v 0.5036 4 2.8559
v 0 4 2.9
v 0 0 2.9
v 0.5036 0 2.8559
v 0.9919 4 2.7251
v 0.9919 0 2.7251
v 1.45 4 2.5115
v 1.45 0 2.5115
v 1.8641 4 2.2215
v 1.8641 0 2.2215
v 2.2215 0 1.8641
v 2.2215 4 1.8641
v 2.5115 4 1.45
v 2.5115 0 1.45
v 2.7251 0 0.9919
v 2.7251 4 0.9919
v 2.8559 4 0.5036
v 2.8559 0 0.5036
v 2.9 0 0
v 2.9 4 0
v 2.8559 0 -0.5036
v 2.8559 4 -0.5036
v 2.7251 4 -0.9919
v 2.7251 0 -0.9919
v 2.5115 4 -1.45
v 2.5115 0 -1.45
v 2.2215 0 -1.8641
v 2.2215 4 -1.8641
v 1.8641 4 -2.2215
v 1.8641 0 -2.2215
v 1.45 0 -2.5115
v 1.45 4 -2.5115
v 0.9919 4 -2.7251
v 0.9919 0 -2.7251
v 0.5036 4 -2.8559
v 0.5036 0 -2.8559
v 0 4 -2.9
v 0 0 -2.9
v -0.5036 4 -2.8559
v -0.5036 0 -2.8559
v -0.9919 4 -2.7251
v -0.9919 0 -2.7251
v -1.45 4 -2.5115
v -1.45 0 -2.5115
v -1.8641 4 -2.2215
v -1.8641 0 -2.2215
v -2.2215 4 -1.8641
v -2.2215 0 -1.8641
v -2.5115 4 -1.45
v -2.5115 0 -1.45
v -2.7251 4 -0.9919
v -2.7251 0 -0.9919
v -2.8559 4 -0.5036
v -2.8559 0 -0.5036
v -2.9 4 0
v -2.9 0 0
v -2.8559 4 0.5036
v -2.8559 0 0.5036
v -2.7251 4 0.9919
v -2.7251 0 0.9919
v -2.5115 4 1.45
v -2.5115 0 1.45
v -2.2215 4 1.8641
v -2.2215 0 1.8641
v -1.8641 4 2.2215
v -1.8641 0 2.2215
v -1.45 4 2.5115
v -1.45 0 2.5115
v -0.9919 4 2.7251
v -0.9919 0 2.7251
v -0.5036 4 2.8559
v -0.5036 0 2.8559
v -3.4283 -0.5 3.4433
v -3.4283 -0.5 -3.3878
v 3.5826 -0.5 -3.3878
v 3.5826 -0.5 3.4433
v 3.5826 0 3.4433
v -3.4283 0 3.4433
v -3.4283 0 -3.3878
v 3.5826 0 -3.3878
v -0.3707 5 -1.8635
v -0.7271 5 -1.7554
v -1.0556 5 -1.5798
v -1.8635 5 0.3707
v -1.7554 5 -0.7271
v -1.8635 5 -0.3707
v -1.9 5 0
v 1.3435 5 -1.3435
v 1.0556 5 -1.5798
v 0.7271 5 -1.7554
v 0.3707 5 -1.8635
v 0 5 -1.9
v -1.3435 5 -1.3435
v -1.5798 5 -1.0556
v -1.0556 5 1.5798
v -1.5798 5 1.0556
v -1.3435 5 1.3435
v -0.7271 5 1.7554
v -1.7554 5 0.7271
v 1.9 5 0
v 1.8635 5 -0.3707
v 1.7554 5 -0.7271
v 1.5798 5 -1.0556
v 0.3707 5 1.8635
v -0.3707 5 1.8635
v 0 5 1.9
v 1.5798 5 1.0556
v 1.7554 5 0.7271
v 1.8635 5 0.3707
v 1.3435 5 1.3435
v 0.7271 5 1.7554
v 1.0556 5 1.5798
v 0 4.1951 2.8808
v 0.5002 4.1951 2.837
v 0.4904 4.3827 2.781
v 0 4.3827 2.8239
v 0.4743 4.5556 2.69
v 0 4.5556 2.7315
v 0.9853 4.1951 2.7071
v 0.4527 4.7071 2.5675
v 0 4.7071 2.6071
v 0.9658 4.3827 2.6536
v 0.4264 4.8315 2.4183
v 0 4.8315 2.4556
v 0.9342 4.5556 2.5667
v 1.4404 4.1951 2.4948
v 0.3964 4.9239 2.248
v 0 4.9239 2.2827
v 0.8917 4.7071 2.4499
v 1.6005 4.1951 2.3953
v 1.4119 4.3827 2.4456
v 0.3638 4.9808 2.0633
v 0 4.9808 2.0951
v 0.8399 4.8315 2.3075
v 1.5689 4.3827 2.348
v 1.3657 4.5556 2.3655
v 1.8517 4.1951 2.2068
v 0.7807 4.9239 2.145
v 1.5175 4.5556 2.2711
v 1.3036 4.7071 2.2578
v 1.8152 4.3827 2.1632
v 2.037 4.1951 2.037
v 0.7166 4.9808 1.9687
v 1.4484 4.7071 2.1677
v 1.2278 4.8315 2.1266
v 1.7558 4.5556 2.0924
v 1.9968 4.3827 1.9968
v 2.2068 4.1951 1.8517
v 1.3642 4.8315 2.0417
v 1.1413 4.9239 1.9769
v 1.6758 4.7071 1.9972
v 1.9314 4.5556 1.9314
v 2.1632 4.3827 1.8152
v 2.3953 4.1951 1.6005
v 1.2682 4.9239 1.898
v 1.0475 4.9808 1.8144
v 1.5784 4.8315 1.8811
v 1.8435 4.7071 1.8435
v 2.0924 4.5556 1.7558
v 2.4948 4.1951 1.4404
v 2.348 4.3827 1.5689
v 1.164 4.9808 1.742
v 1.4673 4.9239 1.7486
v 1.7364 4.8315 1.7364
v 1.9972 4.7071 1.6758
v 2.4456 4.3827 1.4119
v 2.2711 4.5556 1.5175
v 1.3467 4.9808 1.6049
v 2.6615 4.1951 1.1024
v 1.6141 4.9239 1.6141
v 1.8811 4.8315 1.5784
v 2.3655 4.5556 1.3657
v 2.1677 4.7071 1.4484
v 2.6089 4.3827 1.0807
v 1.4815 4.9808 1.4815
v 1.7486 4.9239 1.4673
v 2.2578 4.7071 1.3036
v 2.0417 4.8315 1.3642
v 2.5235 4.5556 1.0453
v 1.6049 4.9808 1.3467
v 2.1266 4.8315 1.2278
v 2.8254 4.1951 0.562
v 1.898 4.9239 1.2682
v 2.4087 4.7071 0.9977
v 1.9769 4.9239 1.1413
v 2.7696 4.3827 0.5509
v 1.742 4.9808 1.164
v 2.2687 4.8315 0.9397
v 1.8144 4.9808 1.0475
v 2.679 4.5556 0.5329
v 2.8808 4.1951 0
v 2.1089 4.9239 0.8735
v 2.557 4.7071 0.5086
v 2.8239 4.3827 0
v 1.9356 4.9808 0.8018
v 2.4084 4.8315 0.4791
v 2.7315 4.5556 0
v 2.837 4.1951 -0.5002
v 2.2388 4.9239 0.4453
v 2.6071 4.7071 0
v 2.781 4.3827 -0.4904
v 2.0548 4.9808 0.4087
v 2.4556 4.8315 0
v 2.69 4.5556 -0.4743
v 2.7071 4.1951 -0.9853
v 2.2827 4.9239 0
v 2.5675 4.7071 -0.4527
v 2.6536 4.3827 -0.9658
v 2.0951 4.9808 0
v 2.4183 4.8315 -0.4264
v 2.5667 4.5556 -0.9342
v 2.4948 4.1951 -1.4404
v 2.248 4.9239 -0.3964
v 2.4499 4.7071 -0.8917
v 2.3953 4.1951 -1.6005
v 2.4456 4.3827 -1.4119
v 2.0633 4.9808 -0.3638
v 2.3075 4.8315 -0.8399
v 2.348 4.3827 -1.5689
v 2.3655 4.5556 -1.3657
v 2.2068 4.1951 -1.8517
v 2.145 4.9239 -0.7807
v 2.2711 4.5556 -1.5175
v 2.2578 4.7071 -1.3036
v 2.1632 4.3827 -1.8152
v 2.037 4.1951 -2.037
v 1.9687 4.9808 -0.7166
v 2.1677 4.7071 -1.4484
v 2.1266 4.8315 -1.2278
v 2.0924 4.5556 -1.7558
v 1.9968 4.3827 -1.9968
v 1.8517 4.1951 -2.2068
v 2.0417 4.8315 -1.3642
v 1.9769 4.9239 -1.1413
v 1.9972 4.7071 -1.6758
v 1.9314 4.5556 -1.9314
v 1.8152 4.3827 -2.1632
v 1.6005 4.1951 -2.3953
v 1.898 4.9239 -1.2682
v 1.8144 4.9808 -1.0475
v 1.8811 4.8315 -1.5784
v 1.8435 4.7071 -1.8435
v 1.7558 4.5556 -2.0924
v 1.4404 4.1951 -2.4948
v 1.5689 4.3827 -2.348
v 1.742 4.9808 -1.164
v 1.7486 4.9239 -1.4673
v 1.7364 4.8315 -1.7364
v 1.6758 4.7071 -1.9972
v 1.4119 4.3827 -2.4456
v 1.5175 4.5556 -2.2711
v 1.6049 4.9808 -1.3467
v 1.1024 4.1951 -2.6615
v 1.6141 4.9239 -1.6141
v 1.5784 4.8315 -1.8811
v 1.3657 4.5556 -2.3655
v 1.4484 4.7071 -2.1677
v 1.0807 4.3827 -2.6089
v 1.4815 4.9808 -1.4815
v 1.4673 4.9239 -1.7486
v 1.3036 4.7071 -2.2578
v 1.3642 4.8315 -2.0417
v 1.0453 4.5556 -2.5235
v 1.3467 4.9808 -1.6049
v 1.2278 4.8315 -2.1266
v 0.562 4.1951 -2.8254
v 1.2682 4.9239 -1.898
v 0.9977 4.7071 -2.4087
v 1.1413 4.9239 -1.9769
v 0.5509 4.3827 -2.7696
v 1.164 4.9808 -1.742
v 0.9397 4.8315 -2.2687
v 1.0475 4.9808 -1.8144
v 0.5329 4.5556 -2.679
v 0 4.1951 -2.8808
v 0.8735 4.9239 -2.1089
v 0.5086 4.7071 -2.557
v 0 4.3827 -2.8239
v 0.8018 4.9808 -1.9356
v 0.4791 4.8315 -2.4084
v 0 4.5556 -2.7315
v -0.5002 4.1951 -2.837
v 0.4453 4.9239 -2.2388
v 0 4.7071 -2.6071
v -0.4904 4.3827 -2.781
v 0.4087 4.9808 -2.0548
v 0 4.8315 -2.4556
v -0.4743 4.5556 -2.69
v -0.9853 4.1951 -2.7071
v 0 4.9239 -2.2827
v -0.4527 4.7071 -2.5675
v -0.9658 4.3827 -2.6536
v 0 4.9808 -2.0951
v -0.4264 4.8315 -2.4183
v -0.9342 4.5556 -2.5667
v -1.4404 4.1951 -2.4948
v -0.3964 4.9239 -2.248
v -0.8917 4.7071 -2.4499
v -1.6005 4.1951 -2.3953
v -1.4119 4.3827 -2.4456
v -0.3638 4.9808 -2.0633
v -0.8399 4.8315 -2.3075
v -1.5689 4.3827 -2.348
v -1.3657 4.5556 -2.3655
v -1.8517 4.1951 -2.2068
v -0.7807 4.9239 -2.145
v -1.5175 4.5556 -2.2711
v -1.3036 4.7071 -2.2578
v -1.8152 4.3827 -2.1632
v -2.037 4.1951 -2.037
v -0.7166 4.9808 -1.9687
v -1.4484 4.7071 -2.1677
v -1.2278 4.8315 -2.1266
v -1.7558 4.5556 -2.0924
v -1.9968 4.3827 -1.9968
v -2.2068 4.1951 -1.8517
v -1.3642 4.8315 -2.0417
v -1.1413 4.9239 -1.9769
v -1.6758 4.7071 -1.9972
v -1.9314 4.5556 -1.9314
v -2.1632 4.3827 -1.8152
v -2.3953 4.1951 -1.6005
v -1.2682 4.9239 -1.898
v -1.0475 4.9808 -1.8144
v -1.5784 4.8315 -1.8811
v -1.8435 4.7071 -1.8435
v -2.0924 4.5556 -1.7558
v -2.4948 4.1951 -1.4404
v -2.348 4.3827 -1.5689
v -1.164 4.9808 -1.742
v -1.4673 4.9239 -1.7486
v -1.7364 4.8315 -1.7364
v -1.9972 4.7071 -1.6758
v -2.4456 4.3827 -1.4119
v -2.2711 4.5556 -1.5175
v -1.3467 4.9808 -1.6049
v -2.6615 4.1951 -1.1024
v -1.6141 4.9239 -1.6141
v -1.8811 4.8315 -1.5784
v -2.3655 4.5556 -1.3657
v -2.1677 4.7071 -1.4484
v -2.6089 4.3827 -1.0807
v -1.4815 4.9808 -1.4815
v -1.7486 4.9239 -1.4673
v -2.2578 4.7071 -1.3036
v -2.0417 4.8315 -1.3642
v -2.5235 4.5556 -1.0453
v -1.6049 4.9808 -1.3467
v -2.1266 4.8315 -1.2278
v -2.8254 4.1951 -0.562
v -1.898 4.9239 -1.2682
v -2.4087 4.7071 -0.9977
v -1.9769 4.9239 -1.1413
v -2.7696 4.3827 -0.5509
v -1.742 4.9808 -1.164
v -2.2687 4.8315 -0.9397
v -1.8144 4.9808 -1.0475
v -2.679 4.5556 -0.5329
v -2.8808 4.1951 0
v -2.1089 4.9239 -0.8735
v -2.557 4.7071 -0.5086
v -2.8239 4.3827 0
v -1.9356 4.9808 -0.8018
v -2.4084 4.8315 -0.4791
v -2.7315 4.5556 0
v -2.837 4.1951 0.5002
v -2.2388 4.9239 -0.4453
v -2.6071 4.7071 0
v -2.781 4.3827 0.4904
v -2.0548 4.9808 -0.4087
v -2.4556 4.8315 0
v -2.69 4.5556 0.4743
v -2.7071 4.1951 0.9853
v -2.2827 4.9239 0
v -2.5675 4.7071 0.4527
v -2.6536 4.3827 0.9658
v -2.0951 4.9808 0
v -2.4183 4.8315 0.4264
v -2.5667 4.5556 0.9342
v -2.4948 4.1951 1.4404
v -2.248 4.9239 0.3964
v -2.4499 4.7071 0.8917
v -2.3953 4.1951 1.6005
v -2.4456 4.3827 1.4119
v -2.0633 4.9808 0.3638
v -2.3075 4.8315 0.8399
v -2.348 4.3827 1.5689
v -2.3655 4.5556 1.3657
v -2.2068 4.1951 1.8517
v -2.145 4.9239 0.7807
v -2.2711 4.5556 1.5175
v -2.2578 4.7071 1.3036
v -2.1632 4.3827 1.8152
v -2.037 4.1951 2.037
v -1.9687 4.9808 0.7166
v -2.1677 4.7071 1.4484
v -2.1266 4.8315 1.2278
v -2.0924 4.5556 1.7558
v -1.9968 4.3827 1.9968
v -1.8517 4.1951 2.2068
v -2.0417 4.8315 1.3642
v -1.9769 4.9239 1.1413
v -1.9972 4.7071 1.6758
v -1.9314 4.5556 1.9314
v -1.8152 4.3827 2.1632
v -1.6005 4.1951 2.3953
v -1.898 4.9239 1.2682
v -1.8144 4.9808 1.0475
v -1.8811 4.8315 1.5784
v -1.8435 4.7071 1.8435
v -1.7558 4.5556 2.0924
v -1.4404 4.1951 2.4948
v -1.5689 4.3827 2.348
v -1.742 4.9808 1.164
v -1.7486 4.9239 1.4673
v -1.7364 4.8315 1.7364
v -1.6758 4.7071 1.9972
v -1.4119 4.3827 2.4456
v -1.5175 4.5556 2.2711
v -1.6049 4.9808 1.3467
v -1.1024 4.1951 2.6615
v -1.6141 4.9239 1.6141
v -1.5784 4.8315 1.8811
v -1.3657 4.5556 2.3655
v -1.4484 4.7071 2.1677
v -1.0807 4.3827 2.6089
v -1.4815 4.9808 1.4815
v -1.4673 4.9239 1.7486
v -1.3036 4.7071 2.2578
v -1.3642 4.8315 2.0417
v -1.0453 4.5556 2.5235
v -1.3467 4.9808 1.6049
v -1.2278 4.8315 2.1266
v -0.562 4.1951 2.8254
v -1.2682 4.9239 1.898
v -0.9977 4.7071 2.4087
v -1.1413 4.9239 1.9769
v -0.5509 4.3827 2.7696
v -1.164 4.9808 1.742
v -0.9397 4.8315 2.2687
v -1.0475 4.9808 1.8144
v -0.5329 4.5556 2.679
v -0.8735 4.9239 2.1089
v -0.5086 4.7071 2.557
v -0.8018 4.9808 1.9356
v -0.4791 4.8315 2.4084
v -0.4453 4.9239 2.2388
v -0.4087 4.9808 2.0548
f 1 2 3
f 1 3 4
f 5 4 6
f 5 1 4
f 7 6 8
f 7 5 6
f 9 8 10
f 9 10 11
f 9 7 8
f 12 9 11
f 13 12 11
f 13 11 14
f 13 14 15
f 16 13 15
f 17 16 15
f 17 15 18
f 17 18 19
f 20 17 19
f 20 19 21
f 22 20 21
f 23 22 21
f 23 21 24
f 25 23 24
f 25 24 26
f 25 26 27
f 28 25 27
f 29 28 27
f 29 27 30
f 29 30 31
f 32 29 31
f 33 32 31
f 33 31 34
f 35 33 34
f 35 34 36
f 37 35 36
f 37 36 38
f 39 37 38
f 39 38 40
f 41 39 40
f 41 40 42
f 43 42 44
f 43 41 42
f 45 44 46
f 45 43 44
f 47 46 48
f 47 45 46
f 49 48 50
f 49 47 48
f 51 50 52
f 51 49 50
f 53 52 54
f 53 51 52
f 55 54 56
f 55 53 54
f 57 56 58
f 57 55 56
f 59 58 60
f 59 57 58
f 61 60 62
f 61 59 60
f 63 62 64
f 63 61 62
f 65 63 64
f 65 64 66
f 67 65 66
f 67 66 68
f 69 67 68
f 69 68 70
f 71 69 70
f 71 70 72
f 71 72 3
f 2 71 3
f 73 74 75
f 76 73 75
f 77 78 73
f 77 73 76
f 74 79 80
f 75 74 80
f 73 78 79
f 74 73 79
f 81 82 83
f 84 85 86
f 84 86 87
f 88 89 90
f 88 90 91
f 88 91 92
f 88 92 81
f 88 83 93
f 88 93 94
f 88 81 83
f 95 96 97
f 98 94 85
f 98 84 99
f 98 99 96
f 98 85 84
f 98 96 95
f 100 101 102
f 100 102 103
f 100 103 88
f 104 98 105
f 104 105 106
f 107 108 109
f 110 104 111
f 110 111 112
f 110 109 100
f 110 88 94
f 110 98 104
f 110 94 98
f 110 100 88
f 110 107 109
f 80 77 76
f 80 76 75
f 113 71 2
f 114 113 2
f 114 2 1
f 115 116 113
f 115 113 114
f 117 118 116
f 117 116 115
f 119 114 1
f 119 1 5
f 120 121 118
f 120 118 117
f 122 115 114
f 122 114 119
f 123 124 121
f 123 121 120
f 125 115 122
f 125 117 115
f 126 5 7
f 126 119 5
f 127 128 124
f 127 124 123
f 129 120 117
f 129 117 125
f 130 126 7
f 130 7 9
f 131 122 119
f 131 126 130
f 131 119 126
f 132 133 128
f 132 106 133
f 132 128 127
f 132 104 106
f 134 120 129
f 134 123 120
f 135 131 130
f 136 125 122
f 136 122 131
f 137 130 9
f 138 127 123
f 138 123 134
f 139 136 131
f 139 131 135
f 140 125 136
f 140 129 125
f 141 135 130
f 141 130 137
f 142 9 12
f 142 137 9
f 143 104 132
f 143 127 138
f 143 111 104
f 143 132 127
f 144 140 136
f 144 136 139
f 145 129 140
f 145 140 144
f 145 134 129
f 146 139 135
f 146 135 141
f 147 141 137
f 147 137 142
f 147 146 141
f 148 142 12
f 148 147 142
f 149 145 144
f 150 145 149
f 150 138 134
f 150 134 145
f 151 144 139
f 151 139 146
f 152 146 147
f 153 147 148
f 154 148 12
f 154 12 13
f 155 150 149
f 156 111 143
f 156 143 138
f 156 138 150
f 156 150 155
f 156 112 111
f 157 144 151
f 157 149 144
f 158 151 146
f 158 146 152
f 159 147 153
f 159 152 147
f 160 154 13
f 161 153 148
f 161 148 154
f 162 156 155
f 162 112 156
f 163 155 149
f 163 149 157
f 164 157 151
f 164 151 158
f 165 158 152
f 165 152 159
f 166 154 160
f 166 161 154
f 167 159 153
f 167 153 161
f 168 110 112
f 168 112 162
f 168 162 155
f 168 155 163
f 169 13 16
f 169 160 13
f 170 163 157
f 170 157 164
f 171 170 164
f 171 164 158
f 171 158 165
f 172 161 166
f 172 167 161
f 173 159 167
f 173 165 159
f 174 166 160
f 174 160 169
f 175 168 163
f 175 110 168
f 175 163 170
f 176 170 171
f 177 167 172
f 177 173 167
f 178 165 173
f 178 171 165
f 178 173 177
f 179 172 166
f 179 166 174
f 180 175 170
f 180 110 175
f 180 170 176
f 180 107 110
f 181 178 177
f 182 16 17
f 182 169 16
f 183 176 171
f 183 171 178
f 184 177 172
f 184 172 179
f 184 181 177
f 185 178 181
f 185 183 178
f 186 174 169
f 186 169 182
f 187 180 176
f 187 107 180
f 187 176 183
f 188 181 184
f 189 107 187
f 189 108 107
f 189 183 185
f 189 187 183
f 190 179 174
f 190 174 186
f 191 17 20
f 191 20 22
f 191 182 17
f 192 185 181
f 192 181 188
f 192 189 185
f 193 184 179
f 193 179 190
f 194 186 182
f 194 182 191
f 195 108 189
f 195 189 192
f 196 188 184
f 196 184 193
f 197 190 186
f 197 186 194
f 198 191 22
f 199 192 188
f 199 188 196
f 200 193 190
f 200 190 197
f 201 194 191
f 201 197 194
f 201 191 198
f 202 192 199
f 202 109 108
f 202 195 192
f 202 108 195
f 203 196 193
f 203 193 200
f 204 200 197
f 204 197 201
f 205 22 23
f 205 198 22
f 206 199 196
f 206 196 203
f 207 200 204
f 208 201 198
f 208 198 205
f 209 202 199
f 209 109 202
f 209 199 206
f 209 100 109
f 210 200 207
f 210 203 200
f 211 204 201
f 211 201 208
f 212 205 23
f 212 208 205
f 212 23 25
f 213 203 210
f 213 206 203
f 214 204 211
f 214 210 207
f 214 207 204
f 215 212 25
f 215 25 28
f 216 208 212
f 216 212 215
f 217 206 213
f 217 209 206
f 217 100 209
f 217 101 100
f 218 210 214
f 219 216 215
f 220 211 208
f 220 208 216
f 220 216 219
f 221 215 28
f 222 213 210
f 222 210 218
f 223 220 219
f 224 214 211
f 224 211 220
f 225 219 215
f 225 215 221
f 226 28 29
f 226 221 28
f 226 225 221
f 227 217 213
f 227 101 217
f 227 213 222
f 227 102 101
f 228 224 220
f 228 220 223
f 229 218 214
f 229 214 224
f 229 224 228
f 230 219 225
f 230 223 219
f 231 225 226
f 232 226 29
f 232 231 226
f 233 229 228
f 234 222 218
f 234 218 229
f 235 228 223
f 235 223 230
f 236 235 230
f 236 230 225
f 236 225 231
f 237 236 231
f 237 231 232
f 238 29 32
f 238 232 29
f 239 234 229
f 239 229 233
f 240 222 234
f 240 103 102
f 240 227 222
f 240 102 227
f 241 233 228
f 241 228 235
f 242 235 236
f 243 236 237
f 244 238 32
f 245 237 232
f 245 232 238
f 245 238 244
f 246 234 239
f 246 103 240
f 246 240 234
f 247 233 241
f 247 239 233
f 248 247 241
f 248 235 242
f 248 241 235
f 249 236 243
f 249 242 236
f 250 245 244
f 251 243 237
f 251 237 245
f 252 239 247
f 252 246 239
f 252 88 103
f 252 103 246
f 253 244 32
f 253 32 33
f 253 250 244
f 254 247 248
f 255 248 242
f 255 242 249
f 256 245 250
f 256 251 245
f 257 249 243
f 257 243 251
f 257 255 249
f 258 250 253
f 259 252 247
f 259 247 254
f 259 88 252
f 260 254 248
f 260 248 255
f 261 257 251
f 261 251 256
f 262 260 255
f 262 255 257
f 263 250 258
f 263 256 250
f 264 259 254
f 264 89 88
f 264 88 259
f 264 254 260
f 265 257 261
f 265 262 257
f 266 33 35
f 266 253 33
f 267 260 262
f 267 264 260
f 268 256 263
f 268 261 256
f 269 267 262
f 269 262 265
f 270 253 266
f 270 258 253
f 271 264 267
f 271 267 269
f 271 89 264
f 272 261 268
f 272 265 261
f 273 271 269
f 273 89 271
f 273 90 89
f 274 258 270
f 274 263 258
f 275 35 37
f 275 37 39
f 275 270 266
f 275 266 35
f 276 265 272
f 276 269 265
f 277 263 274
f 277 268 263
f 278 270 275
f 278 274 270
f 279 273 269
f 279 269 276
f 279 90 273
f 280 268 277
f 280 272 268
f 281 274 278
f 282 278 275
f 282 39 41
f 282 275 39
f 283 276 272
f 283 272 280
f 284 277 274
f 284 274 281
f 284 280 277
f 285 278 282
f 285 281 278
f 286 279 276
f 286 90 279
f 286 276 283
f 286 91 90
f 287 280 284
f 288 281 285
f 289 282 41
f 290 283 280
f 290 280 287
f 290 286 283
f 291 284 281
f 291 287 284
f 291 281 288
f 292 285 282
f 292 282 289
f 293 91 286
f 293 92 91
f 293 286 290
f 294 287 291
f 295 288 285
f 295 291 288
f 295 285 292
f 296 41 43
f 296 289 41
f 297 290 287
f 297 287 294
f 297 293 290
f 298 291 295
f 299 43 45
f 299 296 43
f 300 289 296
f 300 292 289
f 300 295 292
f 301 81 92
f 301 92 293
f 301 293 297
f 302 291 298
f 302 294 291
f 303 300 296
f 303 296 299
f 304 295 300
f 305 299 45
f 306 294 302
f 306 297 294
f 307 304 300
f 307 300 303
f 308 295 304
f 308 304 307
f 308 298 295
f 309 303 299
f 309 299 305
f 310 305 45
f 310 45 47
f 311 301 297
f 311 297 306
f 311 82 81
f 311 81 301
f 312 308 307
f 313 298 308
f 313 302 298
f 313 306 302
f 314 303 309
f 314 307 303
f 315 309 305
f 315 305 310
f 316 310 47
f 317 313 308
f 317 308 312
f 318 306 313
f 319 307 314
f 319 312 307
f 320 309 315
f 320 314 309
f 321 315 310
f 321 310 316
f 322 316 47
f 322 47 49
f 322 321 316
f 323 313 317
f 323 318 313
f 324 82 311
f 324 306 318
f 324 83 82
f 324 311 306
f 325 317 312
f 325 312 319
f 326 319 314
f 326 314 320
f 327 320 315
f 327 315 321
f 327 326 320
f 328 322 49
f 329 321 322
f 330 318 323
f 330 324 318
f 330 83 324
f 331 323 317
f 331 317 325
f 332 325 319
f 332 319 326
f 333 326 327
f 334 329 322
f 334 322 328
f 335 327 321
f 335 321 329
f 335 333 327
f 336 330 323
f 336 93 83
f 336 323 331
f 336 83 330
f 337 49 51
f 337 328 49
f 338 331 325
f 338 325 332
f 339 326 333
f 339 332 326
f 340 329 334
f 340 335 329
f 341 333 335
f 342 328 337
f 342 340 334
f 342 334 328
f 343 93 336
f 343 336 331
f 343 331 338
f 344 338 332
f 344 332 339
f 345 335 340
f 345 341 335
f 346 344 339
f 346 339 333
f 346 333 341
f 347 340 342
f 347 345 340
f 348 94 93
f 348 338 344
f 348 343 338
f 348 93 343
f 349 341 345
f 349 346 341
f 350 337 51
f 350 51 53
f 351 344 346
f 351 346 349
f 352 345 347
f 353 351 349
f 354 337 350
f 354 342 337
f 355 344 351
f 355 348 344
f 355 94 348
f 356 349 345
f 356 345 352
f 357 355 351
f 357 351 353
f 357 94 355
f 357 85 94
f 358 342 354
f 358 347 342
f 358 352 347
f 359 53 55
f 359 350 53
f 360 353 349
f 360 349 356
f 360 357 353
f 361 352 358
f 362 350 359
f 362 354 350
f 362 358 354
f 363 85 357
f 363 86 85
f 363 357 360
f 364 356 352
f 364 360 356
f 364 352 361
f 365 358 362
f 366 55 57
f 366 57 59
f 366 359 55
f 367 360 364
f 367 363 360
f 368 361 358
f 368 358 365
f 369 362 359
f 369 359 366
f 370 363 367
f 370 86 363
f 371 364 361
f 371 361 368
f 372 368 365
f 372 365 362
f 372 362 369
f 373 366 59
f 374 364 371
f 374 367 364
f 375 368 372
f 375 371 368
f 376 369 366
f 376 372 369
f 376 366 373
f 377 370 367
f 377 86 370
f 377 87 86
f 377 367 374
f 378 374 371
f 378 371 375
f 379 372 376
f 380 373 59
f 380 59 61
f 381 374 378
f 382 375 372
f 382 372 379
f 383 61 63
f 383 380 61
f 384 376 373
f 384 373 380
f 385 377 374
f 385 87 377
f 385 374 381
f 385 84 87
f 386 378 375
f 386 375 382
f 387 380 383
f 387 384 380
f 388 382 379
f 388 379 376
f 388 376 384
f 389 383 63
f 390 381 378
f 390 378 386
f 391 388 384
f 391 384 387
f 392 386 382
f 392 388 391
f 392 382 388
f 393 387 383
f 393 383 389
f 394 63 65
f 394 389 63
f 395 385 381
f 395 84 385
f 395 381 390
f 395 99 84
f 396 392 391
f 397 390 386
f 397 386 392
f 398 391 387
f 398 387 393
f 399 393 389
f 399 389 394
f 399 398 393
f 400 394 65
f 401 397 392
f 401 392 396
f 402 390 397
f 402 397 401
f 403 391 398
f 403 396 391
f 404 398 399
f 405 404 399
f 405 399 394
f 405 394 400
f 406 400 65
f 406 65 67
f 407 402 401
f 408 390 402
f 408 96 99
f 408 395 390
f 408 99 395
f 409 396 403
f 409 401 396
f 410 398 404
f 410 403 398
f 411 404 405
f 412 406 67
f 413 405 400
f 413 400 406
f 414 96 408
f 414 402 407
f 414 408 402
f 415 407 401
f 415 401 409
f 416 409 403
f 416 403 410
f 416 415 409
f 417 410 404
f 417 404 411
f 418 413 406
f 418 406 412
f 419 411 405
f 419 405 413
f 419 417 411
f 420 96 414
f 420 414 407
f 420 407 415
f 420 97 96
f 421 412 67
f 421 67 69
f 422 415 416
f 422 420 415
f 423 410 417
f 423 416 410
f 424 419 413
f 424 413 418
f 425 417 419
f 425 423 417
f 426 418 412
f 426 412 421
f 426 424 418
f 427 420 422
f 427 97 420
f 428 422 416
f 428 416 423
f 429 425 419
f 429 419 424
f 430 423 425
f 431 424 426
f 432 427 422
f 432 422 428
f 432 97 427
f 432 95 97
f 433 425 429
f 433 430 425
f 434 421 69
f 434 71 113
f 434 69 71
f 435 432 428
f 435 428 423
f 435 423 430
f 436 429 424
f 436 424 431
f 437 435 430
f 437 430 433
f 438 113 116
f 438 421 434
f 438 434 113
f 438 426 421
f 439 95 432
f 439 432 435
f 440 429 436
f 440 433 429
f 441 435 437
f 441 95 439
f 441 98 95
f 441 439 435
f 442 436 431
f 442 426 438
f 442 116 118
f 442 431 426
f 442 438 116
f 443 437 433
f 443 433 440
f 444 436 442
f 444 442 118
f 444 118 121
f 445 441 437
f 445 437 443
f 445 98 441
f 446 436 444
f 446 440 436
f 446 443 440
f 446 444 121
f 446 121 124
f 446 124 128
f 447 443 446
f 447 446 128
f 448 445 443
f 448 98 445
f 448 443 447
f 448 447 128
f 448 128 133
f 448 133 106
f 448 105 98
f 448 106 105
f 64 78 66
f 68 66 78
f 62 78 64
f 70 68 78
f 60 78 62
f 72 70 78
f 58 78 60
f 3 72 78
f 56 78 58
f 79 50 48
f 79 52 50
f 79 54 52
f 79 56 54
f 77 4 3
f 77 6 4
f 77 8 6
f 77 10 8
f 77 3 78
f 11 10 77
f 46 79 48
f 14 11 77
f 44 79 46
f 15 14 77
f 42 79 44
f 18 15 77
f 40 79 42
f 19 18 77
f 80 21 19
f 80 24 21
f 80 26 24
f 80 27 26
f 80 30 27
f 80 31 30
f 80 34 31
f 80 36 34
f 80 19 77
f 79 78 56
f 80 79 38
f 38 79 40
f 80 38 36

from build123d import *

# Parameters (mm, degrees)
SKETCH2_R           = 2.9
BOSS_EXTRUDE1_DEPTH = 0.5
BOSS_EXTRUDE2_START = 5
SKETCH3_R           = 2.9
BOSS_EXTRUDE2_DEPTH = 5
SKETCH4_W           = 7.010834482
SKETCH4_H           = 6.831005896
BOSS_EXTRUDE3_DEPTH = 0.5
FILLET1_R           = 1


with BuildPart() as part:
    # Sketch2 → Boss-Extrude1 (new body)
    with BuildSketch(Plane(origin=(0, 0, 0), x_dir=(1, 0, 0), z_dir=(0, 1, 0))):
        with Locations(Location((0, 0, 0), (0, 0, 270))):
            Circle(SKETCH2_R)
    extrude(amount=-BOSS_EXTRUDE1_DEPTH)

    # Sketch3 → Boss-Extrude2 (add)
    with BuildSketch(Plane(origin=(0, 0, 0), x_dir=(1, 0, 0), z_dir=(0, 1, 0)).offset(BOSS_EXTRUDE2_START)):
        with Locations(Location((0, 0, 0), (0, 0, 270))):
            Circle(SKETCH3_R)
    extrude(amount=-BOSS_EXTRUDE2_DEPTH)

    # Sketch4 → Boss-Extrude3 (add)
    with BuildSketch(Plane(origin=(0, 0, 0), x_dir=(1, 0, 0), z_dir=(0, 1, 0))):
        with Locations((0.077133625, -0.02775209)):
            Rectangle(SKETCH4_W, SKETCH4_H)
    extrude(amount=-BOSS_EXTRUDE3_DEPTH)

    # Fillet1
    fillet1_edges = [part.edges().sort_by_distance(p)[0] for p in [
        (0, 5, -2.9),
    ]]
    fillet(fillet1_edges, radius=FILLET1_R)


solid = part.part
